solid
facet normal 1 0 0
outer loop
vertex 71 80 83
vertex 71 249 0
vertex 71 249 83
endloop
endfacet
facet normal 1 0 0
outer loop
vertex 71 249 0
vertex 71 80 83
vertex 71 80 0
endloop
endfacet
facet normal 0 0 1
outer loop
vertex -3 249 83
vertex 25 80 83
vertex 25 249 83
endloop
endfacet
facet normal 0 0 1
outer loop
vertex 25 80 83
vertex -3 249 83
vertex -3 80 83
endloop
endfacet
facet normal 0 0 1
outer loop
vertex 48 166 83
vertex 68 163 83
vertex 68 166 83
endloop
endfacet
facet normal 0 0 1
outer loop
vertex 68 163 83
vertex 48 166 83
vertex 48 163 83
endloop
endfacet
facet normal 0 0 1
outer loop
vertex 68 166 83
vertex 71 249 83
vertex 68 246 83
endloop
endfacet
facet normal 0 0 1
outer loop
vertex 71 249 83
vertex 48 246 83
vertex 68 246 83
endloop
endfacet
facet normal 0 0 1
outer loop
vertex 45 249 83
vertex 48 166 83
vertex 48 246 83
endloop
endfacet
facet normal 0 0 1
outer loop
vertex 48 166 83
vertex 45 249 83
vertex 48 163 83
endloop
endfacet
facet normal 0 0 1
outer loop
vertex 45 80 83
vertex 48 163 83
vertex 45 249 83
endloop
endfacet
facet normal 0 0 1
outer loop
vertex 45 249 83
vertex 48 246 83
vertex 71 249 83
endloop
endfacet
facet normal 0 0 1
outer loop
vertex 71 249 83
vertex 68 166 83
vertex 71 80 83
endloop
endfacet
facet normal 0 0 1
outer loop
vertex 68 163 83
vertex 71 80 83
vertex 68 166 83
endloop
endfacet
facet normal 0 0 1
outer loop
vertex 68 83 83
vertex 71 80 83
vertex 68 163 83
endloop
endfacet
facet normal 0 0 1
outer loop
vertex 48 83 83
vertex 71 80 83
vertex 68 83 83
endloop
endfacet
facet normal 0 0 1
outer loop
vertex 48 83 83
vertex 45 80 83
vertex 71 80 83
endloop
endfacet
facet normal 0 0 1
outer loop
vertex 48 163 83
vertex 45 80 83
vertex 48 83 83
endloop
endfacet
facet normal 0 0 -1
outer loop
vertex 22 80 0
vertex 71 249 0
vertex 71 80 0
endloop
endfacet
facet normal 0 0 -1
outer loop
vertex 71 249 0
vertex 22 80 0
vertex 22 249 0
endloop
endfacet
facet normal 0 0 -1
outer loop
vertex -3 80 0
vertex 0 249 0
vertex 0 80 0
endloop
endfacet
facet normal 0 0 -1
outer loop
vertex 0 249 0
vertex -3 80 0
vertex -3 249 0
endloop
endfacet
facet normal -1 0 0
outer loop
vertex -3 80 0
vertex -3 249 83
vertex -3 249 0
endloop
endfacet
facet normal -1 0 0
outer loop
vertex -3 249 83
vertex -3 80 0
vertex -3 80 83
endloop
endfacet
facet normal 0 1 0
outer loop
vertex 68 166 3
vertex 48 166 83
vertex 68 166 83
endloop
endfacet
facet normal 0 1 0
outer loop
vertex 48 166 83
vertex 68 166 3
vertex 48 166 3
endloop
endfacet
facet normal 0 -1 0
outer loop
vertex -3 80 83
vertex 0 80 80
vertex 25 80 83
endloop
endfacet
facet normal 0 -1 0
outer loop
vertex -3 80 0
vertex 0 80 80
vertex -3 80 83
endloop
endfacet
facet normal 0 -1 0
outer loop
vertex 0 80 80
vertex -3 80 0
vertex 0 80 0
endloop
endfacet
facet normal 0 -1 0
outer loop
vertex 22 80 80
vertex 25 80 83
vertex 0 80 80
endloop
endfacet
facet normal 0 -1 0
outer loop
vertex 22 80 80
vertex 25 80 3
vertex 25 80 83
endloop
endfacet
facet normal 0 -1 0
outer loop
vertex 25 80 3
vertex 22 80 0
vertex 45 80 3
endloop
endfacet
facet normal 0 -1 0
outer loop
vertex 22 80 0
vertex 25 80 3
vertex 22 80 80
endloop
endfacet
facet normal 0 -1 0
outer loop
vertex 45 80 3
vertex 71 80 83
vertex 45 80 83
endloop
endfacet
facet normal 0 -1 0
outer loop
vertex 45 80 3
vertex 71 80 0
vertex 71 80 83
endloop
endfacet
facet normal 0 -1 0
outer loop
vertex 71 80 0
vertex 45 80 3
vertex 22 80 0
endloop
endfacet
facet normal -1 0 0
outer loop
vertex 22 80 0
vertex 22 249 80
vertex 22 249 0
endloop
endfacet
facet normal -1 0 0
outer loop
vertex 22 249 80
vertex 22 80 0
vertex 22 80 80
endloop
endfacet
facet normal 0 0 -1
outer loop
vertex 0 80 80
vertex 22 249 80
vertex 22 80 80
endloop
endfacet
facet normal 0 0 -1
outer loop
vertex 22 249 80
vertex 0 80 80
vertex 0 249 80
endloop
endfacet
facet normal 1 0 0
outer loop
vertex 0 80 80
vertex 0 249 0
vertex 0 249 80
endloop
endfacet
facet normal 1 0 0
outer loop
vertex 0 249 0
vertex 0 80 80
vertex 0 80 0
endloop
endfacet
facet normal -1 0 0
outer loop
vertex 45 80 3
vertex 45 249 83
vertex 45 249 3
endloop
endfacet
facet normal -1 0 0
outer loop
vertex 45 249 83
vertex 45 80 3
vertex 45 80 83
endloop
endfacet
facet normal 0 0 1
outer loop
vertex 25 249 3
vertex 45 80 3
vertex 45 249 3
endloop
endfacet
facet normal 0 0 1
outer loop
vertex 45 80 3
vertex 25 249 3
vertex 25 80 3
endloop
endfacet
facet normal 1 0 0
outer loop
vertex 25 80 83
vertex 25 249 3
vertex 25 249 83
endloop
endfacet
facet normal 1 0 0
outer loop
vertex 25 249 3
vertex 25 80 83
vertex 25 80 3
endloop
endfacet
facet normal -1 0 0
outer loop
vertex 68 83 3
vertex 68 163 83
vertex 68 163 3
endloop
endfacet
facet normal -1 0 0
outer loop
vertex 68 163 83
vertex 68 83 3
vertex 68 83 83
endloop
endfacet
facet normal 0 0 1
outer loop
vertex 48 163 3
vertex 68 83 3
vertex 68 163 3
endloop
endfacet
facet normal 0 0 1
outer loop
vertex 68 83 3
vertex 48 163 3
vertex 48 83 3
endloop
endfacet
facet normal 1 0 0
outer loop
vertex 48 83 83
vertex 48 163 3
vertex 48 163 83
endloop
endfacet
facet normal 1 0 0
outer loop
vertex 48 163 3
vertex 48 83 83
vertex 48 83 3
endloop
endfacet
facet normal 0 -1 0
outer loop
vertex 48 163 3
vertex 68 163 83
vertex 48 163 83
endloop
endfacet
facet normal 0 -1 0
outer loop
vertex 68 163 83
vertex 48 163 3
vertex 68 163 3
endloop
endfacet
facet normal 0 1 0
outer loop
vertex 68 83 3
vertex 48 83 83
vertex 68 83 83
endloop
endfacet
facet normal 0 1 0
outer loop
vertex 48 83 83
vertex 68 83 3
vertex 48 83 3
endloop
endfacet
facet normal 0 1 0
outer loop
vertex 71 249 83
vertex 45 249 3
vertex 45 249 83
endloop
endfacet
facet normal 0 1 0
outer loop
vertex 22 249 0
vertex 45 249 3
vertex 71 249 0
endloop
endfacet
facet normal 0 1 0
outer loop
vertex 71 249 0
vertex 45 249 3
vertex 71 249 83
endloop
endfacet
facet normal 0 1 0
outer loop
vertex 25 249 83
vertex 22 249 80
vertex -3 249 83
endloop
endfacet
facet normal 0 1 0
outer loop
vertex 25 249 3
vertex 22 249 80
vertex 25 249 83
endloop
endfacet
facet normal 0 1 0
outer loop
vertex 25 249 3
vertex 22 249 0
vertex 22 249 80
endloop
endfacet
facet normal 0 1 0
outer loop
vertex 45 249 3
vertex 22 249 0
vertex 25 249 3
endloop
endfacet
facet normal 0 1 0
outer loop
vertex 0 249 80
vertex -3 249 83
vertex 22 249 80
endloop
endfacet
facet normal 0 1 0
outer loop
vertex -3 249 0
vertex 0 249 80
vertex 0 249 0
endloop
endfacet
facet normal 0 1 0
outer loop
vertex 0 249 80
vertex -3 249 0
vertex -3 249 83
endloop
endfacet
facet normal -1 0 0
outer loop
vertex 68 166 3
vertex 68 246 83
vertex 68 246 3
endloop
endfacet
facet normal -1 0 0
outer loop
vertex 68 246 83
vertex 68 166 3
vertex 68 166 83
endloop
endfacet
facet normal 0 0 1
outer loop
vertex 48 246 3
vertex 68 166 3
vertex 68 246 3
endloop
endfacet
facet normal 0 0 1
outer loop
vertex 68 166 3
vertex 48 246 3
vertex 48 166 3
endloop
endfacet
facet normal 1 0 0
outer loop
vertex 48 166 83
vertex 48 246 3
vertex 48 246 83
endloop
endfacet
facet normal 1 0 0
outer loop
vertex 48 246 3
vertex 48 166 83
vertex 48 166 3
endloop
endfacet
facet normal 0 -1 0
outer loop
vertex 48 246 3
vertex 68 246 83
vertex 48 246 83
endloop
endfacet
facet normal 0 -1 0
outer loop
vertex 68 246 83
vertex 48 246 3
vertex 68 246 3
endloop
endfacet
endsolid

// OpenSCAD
// Size of the clip, thickness of the bed frame +2mm seems to work well
clip_width = 22; // [1:0.5:50]

// Width of the phone slot
phone_slot_width = 80; // [10:200]

// Height of the phone slot
phone_slot_height = 80; // [10:200]

// Thickness of the phone slot
phone_slot_thickness = 20; // [1:100]

// Thickness of the clip/box, lower to save time/material, higher to increase strength 
clip_thickness = 3; // [1:20]

// Thickness of the tablet slot, set to 0 to remove it
tablet_slot_thickness = 20; // [0:100]

// Number of phone slots side-by-side
number_of_phone_slots = 2; //  [1, 2, 3, 4, 5, 6, 7, 8, 9, 10]


bed_caddy(  clip_width, 
            phone_slot_width, 
            phone_slot_height, 
            phone_slot_thickness, 
            clip_thickness, 
            tablet_slot_thickness, 
            number_of_phone_slots );

module bed_caddy(clip_length, width, height, depth, thickness, tablet_thickness, phone_slots) {
    for (i =[1:phone_slots])
        translate([0,i*(width+thickness),0]) phone_holder(clip_length, width, height, depth, thickness, tablet_thickness);
    
}

module phone_holder(clip_length, width, height, depth, thickness, tablet_thickness) {
    tablet_offset = tablet_thickness ? thickness + tablet_thickness : 0;
    total_depth = clip_length+depth+thickness*3+tablet_offset;

    difference(){
        translate([-thickness,-thickness,0]) 
            cube([total_depth, width+thickness*2, height+thickness]);
        
        translate([0,-thickness-1,-1])
            cube([clip_length, width+thickness*2+2, height+1]);
        
        translate([clip_length+thickness,-thickness-1,thickness])
            cube([tablet_thickness, width+thickness*2+2, height+1]);
        
        translate([clip_length+thickness+tablet_offset,0,thickness]) 
            cube([depth, width, height+1]);
    }
}
